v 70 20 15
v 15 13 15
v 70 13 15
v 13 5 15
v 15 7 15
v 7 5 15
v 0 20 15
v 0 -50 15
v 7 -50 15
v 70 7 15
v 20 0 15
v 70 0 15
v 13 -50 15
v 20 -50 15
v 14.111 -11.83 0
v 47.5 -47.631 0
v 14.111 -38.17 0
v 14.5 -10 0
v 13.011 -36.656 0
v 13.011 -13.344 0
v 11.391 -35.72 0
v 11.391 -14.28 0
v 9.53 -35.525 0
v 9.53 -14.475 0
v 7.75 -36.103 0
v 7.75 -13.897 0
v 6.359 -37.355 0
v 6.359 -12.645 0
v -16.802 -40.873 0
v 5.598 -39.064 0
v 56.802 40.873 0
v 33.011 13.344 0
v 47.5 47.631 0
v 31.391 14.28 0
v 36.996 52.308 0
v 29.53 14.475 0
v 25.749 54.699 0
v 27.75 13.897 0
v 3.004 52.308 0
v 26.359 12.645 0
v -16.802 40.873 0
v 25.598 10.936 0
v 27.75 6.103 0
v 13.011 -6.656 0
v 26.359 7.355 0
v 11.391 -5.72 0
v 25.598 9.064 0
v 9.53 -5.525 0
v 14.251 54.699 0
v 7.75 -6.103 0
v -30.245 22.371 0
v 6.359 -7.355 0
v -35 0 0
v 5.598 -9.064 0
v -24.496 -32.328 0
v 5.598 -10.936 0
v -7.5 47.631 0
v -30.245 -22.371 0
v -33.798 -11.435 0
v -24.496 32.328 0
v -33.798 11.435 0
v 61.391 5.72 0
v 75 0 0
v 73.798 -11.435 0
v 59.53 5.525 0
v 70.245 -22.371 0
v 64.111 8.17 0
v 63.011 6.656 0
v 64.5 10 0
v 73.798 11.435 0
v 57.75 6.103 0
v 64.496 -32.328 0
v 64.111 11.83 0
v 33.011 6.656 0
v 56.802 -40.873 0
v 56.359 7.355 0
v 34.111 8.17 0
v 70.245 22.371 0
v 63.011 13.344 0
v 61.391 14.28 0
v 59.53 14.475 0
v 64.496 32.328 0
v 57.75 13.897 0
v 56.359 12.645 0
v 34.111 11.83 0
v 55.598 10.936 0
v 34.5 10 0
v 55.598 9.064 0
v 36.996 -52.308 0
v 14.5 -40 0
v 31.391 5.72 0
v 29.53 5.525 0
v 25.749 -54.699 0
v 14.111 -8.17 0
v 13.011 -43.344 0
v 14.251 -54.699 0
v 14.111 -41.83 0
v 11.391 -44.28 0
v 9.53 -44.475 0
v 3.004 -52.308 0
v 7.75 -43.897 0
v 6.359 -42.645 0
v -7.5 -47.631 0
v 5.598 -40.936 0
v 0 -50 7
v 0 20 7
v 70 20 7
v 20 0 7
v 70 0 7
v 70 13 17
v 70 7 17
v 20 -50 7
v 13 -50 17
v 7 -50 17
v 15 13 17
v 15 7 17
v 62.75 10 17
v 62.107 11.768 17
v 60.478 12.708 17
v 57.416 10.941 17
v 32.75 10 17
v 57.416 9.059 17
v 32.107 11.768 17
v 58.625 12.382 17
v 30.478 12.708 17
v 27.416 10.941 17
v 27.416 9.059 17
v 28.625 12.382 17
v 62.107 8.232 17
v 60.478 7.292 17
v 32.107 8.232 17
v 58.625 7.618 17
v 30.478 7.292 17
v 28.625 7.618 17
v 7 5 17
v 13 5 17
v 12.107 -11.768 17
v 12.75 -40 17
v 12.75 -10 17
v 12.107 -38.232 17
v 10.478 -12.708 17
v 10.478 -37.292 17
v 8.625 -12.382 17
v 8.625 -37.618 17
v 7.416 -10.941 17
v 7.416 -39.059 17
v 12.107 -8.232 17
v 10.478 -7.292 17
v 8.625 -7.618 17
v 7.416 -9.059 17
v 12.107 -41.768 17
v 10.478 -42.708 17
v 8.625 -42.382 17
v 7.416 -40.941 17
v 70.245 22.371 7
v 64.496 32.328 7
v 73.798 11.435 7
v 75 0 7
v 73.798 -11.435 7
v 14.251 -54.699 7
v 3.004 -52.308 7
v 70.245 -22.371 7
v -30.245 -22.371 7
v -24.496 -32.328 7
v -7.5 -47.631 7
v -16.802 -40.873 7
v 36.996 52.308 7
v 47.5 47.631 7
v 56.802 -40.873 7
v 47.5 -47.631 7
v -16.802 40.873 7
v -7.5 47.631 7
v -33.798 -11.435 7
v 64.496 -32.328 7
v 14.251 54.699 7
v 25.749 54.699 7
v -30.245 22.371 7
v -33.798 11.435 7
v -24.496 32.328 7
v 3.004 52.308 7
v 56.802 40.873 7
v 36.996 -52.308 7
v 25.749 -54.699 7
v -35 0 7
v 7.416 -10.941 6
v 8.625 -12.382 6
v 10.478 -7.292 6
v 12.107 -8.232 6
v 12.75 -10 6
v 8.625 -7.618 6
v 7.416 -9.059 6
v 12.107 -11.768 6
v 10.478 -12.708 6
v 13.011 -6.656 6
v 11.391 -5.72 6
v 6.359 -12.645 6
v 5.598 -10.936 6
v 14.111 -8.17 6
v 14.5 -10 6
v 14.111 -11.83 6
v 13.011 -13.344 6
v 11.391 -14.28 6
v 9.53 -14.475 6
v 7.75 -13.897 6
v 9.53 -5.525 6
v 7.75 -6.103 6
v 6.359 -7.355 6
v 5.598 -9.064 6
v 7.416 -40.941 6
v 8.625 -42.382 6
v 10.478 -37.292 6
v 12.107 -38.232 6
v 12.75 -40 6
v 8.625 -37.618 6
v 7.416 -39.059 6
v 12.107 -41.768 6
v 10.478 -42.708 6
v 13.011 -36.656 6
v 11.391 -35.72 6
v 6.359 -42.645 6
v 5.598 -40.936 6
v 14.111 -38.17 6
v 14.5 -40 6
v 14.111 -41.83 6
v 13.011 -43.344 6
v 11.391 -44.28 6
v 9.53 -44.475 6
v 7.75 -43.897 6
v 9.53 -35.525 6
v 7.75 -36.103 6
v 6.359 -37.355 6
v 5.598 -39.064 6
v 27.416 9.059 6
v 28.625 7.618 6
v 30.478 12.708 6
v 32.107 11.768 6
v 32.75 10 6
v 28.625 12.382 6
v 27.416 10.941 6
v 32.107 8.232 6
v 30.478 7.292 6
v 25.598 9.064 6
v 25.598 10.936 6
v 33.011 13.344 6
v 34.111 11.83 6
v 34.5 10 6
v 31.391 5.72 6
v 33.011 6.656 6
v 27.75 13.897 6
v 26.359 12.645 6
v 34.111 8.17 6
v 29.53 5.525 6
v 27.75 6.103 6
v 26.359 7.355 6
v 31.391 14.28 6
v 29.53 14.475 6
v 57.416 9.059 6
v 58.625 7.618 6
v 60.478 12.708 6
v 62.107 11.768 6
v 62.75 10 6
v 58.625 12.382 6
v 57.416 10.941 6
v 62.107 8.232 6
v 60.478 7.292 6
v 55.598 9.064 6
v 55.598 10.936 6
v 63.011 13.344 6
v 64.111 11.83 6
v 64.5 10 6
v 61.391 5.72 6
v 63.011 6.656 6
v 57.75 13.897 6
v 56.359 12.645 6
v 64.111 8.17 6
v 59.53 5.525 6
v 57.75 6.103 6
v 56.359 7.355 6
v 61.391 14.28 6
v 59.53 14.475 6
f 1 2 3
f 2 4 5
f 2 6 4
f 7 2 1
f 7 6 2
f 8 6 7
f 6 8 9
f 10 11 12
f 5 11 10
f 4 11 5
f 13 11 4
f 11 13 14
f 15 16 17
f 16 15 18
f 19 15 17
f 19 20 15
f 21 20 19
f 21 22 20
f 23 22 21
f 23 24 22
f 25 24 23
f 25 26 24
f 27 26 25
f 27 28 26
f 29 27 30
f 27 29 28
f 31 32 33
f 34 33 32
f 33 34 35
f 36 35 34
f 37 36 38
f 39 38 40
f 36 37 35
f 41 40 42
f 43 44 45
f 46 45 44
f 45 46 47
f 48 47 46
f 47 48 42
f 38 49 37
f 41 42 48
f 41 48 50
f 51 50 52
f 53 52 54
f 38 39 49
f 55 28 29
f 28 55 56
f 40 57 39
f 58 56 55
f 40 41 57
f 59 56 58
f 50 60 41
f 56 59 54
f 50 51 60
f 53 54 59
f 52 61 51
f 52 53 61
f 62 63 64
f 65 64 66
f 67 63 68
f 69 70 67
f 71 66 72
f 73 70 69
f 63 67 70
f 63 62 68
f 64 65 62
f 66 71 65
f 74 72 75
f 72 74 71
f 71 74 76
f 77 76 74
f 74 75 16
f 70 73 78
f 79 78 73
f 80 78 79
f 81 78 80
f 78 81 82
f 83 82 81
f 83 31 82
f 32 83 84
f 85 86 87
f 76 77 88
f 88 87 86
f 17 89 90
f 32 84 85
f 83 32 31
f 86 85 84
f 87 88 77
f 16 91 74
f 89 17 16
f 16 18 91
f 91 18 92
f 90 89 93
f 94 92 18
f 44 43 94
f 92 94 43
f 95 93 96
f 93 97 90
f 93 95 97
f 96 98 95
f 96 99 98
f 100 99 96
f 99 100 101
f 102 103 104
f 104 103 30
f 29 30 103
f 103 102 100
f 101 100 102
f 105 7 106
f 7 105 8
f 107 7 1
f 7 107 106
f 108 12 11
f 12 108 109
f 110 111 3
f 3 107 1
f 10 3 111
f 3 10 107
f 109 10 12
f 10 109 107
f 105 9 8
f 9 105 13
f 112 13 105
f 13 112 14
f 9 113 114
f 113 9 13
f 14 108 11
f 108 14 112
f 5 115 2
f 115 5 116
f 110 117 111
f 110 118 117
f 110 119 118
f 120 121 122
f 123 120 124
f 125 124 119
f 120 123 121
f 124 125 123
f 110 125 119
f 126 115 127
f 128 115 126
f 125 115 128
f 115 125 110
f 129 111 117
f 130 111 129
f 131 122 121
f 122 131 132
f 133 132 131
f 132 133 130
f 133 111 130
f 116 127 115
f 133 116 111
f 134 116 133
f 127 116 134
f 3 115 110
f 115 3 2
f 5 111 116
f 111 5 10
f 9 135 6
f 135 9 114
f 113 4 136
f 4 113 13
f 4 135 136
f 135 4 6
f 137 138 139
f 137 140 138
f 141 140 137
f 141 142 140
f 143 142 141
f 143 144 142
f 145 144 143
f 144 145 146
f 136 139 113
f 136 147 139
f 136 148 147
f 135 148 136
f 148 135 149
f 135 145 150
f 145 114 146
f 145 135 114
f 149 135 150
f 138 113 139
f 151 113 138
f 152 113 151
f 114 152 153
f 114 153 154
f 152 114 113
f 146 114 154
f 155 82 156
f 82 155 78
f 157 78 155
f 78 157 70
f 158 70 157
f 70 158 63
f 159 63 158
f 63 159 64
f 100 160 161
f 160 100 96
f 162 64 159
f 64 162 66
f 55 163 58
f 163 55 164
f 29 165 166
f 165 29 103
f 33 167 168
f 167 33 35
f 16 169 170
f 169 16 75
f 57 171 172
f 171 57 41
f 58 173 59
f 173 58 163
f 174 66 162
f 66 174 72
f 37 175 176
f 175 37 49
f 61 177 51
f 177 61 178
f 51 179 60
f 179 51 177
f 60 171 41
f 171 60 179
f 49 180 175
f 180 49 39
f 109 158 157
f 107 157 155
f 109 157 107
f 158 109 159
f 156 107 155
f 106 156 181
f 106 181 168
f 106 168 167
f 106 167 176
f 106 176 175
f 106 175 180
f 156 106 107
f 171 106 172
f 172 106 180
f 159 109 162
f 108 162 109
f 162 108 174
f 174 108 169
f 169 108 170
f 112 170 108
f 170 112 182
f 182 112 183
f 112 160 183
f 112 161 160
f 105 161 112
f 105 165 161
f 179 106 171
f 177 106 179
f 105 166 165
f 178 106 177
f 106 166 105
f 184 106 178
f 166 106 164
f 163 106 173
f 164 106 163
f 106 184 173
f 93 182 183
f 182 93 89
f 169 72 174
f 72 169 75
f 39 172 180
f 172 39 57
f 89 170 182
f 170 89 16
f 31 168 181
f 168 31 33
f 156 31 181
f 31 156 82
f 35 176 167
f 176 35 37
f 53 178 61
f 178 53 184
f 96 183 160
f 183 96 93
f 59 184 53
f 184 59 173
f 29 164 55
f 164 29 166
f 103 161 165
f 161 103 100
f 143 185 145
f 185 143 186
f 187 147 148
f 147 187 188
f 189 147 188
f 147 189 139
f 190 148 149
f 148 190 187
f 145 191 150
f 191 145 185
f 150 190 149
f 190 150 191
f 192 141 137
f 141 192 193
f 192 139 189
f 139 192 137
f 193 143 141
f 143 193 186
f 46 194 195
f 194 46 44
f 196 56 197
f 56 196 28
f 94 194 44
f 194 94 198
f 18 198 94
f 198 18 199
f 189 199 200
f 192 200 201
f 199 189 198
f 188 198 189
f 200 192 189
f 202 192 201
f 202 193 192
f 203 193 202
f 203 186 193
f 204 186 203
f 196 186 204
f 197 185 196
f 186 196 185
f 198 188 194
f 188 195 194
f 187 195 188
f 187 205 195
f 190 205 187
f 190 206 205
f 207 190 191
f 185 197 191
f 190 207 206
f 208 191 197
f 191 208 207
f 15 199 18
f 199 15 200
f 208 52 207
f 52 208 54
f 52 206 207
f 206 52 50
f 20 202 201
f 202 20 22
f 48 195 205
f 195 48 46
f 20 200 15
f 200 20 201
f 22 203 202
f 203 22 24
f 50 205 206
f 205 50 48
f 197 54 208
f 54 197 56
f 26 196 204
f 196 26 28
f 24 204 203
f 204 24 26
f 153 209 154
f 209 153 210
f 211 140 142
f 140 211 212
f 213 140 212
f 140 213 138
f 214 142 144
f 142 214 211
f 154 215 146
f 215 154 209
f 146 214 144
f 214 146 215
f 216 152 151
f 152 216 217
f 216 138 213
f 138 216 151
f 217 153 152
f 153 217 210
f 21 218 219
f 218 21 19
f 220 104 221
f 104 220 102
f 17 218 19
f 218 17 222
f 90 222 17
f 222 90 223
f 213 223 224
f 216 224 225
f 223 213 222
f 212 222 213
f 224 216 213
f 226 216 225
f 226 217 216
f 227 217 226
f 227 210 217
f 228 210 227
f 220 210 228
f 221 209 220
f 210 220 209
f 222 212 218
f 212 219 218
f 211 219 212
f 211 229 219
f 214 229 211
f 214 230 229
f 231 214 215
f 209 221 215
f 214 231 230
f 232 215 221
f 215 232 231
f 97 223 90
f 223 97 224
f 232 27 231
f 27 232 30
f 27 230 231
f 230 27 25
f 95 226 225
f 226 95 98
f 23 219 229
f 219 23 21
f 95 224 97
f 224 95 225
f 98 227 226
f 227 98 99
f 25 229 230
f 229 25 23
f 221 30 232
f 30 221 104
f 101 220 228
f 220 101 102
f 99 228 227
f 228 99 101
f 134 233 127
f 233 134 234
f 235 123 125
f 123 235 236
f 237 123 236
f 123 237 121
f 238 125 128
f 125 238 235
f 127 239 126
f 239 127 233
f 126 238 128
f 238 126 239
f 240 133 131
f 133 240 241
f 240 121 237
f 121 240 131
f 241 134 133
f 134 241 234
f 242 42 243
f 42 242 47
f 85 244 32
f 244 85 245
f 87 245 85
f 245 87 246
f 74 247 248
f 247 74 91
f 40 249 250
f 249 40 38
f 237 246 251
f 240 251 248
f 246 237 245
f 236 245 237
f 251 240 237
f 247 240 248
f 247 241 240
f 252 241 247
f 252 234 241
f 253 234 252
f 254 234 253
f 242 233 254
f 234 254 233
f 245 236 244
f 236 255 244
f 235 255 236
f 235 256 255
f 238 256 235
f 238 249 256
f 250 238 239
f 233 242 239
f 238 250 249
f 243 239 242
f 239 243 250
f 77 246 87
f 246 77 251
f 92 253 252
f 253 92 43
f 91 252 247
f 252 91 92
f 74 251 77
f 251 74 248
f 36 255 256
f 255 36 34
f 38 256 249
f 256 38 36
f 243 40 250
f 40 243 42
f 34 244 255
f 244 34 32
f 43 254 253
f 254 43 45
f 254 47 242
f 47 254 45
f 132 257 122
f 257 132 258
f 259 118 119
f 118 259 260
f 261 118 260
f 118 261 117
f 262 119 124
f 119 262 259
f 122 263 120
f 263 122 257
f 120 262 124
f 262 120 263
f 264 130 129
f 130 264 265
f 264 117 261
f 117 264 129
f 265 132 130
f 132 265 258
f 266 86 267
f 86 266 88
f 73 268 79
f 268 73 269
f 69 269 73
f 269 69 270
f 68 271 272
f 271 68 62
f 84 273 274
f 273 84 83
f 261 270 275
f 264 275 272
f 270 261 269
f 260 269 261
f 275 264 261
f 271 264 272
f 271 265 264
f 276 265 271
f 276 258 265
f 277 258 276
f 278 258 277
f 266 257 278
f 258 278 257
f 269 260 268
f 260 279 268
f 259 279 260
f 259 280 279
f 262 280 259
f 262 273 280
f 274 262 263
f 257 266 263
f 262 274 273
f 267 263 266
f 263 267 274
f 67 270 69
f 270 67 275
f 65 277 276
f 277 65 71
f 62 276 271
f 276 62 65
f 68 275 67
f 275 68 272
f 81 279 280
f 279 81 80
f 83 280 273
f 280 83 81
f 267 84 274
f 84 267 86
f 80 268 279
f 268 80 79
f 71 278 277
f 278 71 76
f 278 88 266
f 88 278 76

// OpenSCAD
module cubo() {
    union() {
union() {
cube([30,20,15]);
    
translate([20,0,15])
rotate([0,90,0])

cube([10,20,50]);
}
translate([0,0,0])
rotate([90,0,0])
cube([20,15,50]);
}
}


 module cubetto() {
     union() {
   translate([15,7,17])
rotate([0,90,0])

cube([10,6,55]);
     
 translate([7,5,7])
rotate([90,0,0])
cube([6,10,55]); 
     }
     
 }
 
  module vite() {
 translate([10,-30,4])
 cylinder(h=30, d=5.5);
  translate([10,-30,-1])
 cylinder(h=7, d=9);
     
 }
 
   module vite_destra() {
       
 translate([-30,10,4])
 cylinder(h=30, d=5.5);
  translate([-30,10,-1])
 cylinder(h=7, d=9);
     
 }
 
 
 module parte_principale() {
     
     union() {
  union () {   
cubo();

cubetto();
  }
   translate([20,0,0])
 cylinder(h=7, r=55);
  }
 }

 
 module viti_pezzo() {
 translate([0,20,0])
 vite();
 
 translate([0,-10,0])
 vite();
 
  translate([60,0,0])
 vite_destra();
 
 
translate([90,0,0])
 vite_destra();
 }
 
 
 difference() {
     
    
   parte_principale();
      viti_pezzo();
 }
 
